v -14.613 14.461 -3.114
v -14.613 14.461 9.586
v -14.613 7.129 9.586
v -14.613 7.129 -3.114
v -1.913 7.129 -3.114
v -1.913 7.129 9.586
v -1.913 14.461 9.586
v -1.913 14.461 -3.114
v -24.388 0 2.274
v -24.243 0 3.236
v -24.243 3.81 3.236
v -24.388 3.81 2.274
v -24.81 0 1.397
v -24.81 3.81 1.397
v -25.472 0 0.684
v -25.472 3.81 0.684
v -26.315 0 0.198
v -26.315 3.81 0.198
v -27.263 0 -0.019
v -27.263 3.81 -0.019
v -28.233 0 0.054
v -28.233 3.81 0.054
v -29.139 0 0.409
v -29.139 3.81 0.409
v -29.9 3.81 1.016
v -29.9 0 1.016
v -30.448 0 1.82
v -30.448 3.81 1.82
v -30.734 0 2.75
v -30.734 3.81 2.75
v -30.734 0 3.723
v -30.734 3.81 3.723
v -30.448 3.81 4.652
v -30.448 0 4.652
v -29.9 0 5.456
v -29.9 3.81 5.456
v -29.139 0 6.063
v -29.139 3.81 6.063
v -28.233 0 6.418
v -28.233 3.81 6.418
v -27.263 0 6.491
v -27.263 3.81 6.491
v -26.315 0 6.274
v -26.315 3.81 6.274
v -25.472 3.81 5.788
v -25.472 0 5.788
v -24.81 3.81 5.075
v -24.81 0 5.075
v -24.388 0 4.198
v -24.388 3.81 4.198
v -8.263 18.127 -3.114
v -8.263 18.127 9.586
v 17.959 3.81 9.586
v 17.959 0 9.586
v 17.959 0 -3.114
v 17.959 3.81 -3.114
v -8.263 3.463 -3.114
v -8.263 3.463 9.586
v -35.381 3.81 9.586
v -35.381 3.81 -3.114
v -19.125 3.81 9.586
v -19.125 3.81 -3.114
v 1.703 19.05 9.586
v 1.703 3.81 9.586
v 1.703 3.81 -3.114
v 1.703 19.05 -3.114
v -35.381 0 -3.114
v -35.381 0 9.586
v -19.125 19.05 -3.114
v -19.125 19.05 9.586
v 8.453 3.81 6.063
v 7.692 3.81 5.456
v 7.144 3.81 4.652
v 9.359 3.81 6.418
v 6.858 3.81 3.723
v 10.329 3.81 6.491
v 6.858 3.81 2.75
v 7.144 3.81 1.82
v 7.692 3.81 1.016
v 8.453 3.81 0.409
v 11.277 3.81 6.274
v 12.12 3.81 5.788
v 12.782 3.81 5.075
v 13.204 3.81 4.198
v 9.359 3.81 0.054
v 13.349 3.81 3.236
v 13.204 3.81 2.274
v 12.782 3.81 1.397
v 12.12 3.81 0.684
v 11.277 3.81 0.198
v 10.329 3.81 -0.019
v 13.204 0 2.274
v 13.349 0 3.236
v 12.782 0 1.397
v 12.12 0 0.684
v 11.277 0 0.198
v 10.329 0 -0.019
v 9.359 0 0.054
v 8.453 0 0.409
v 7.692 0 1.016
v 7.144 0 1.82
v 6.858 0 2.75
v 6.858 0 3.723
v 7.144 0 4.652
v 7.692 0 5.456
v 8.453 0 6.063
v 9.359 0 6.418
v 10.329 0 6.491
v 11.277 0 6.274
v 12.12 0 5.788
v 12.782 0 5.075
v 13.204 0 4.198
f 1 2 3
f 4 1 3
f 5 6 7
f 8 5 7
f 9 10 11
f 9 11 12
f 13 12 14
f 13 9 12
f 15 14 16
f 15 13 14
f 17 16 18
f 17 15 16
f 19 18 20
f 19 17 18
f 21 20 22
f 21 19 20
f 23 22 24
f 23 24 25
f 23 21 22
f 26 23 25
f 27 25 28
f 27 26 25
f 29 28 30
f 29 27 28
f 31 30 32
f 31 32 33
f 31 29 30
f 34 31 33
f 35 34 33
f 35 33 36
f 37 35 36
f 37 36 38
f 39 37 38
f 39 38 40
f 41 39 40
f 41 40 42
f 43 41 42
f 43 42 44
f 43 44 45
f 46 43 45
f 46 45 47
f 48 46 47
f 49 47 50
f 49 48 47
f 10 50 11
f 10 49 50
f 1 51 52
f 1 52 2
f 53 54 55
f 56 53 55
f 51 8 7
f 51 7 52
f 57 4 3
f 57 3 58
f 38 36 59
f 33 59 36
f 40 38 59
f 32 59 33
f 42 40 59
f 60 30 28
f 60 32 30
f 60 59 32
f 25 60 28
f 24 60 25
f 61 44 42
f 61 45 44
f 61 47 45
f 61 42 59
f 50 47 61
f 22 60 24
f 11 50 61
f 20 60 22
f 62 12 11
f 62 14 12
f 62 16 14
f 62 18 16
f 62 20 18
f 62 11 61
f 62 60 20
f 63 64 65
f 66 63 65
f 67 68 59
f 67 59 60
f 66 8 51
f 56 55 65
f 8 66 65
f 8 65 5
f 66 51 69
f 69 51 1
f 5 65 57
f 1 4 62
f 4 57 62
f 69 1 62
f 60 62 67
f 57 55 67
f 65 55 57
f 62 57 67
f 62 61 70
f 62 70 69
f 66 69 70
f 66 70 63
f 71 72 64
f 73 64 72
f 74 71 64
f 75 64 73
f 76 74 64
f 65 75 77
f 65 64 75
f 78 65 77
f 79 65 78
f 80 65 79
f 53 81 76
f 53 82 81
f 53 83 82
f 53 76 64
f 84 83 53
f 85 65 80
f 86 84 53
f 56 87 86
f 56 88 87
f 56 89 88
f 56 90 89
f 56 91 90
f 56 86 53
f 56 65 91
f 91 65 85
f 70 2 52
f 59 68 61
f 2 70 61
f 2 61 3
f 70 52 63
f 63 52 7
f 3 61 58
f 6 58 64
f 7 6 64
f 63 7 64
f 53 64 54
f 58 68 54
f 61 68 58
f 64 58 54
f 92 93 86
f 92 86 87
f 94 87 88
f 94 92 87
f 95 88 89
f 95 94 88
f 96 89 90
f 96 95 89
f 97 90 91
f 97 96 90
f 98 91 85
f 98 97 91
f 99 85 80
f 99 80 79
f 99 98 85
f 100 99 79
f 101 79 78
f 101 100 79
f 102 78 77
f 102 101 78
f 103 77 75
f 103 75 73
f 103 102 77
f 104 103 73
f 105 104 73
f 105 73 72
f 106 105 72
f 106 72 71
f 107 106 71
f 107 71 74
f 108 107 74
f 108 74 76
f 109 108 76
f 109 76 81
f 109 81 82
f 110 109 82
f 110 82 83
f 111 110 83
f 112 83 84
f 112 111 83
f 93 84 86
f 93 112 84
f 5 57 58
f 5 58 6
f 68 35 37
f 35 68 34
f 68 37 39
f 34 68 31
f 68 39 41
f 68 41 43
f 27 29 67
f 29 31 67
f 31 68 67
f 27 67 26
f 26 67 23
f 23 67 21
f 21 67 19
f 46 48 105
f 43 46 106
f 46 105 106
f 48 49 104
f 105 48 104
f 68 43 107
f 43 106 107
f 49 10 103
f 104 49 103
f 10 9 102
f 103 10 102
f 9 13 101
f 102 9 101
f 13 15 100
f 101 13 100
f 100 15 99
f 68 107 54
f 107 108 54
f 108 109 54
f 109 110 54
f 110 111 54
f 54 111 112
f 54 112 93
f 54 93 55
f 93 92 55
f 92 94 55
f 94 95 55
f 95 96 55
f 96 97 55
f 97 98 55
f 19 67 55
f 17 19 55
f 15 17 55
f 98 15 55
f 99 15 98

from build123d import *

# Parameters (mm, degrees)
SKETCH1_W           = 15.494
SKETCH1_H           = 12.7
SKETCH1_R           = 3.2639
SKETCH1_W_2         = 22.352
BOSS_EXTRUDE3_DEPTH = 3.81
SKETCH3_W           = 20.828
SKETCH3_H           = 12.7
BOSS_EXTRUDE4_DEPTH = 15.24
CUT_EXTRUDE2_REACH  = 14.7


with BuildPart() as part:
    # Sketch1 → Boss-Extrude3 (new body)
    with BuildSketch(Plane(origin=(0, 0, 0), x_dir=(1, 0, 0), z_dir=(0, 1, 0))):
        with Locations((-27.634045528, -3.236090754)):
            Rectangle(SKETCH1_W, SKETCH1_H)
        with Locations((-27.507045528, -3.236090754)):
            Circle(SKETCH1_R, mode=Mode.SUBTRACT)
        with Locations((-8.711045528, -3.236090754)):
            Rectangle(SKETCH1_W_2, SKETCH1_H)
        with Locations((10.211954472, -3.236090754)):
            Rectangle(SKETCH1_W, SKETCH1_H)
        with Locations((10.084954472, -3.236090754)):
            Circle(SKETCH1_R, mode=Mode.SUBTRACT)
    extrude(amount=BOSS_EXTRUDE3_DEPTH)

    # Sketch3 → Boss-Extrude4 (add)
    with BuildSketch(Plane(origin=(0, 3.81, 0), x_dir=(1, 0, 0), z_dir=(0, 1, 0))):
        with Locations((-8.711045528, -3.236090754)):
            Rectangle(SKETCH3_W, SKETCH3_H)
    extrude(amount=BOSS_EXTRUDE4_DEPTH)

    # Sketch4 → Cut-Extrude2 (cut, up to next)
    with BuildSketch(Plane.XY.offset(9.586090754), mode=Mode.PRIVATE) as cut_extrude2_sk1:
        Polygon((-8.262769146, 18.127348419), (-14.612769146, 14.461174209), (-14.612769146, 7.128825791), (-8.262769146, 3.462651581), (-1.912769146, 7.128825791), (-1.912769146, 14.461174209), align=None)
    cut_extrude2_tool1 = extrude(cut_extrude2_sk1.sketch, amount=-CUT_EXTRUDE2_REACH, mode=Mode.PRIVATE) & part.part
    add(cut_extrude2_tool1.solids().sort_by_distance((-8.262769, 10.795, 9.586091))[0], mode=Mode.SUBTRACT)


solid = part.part
